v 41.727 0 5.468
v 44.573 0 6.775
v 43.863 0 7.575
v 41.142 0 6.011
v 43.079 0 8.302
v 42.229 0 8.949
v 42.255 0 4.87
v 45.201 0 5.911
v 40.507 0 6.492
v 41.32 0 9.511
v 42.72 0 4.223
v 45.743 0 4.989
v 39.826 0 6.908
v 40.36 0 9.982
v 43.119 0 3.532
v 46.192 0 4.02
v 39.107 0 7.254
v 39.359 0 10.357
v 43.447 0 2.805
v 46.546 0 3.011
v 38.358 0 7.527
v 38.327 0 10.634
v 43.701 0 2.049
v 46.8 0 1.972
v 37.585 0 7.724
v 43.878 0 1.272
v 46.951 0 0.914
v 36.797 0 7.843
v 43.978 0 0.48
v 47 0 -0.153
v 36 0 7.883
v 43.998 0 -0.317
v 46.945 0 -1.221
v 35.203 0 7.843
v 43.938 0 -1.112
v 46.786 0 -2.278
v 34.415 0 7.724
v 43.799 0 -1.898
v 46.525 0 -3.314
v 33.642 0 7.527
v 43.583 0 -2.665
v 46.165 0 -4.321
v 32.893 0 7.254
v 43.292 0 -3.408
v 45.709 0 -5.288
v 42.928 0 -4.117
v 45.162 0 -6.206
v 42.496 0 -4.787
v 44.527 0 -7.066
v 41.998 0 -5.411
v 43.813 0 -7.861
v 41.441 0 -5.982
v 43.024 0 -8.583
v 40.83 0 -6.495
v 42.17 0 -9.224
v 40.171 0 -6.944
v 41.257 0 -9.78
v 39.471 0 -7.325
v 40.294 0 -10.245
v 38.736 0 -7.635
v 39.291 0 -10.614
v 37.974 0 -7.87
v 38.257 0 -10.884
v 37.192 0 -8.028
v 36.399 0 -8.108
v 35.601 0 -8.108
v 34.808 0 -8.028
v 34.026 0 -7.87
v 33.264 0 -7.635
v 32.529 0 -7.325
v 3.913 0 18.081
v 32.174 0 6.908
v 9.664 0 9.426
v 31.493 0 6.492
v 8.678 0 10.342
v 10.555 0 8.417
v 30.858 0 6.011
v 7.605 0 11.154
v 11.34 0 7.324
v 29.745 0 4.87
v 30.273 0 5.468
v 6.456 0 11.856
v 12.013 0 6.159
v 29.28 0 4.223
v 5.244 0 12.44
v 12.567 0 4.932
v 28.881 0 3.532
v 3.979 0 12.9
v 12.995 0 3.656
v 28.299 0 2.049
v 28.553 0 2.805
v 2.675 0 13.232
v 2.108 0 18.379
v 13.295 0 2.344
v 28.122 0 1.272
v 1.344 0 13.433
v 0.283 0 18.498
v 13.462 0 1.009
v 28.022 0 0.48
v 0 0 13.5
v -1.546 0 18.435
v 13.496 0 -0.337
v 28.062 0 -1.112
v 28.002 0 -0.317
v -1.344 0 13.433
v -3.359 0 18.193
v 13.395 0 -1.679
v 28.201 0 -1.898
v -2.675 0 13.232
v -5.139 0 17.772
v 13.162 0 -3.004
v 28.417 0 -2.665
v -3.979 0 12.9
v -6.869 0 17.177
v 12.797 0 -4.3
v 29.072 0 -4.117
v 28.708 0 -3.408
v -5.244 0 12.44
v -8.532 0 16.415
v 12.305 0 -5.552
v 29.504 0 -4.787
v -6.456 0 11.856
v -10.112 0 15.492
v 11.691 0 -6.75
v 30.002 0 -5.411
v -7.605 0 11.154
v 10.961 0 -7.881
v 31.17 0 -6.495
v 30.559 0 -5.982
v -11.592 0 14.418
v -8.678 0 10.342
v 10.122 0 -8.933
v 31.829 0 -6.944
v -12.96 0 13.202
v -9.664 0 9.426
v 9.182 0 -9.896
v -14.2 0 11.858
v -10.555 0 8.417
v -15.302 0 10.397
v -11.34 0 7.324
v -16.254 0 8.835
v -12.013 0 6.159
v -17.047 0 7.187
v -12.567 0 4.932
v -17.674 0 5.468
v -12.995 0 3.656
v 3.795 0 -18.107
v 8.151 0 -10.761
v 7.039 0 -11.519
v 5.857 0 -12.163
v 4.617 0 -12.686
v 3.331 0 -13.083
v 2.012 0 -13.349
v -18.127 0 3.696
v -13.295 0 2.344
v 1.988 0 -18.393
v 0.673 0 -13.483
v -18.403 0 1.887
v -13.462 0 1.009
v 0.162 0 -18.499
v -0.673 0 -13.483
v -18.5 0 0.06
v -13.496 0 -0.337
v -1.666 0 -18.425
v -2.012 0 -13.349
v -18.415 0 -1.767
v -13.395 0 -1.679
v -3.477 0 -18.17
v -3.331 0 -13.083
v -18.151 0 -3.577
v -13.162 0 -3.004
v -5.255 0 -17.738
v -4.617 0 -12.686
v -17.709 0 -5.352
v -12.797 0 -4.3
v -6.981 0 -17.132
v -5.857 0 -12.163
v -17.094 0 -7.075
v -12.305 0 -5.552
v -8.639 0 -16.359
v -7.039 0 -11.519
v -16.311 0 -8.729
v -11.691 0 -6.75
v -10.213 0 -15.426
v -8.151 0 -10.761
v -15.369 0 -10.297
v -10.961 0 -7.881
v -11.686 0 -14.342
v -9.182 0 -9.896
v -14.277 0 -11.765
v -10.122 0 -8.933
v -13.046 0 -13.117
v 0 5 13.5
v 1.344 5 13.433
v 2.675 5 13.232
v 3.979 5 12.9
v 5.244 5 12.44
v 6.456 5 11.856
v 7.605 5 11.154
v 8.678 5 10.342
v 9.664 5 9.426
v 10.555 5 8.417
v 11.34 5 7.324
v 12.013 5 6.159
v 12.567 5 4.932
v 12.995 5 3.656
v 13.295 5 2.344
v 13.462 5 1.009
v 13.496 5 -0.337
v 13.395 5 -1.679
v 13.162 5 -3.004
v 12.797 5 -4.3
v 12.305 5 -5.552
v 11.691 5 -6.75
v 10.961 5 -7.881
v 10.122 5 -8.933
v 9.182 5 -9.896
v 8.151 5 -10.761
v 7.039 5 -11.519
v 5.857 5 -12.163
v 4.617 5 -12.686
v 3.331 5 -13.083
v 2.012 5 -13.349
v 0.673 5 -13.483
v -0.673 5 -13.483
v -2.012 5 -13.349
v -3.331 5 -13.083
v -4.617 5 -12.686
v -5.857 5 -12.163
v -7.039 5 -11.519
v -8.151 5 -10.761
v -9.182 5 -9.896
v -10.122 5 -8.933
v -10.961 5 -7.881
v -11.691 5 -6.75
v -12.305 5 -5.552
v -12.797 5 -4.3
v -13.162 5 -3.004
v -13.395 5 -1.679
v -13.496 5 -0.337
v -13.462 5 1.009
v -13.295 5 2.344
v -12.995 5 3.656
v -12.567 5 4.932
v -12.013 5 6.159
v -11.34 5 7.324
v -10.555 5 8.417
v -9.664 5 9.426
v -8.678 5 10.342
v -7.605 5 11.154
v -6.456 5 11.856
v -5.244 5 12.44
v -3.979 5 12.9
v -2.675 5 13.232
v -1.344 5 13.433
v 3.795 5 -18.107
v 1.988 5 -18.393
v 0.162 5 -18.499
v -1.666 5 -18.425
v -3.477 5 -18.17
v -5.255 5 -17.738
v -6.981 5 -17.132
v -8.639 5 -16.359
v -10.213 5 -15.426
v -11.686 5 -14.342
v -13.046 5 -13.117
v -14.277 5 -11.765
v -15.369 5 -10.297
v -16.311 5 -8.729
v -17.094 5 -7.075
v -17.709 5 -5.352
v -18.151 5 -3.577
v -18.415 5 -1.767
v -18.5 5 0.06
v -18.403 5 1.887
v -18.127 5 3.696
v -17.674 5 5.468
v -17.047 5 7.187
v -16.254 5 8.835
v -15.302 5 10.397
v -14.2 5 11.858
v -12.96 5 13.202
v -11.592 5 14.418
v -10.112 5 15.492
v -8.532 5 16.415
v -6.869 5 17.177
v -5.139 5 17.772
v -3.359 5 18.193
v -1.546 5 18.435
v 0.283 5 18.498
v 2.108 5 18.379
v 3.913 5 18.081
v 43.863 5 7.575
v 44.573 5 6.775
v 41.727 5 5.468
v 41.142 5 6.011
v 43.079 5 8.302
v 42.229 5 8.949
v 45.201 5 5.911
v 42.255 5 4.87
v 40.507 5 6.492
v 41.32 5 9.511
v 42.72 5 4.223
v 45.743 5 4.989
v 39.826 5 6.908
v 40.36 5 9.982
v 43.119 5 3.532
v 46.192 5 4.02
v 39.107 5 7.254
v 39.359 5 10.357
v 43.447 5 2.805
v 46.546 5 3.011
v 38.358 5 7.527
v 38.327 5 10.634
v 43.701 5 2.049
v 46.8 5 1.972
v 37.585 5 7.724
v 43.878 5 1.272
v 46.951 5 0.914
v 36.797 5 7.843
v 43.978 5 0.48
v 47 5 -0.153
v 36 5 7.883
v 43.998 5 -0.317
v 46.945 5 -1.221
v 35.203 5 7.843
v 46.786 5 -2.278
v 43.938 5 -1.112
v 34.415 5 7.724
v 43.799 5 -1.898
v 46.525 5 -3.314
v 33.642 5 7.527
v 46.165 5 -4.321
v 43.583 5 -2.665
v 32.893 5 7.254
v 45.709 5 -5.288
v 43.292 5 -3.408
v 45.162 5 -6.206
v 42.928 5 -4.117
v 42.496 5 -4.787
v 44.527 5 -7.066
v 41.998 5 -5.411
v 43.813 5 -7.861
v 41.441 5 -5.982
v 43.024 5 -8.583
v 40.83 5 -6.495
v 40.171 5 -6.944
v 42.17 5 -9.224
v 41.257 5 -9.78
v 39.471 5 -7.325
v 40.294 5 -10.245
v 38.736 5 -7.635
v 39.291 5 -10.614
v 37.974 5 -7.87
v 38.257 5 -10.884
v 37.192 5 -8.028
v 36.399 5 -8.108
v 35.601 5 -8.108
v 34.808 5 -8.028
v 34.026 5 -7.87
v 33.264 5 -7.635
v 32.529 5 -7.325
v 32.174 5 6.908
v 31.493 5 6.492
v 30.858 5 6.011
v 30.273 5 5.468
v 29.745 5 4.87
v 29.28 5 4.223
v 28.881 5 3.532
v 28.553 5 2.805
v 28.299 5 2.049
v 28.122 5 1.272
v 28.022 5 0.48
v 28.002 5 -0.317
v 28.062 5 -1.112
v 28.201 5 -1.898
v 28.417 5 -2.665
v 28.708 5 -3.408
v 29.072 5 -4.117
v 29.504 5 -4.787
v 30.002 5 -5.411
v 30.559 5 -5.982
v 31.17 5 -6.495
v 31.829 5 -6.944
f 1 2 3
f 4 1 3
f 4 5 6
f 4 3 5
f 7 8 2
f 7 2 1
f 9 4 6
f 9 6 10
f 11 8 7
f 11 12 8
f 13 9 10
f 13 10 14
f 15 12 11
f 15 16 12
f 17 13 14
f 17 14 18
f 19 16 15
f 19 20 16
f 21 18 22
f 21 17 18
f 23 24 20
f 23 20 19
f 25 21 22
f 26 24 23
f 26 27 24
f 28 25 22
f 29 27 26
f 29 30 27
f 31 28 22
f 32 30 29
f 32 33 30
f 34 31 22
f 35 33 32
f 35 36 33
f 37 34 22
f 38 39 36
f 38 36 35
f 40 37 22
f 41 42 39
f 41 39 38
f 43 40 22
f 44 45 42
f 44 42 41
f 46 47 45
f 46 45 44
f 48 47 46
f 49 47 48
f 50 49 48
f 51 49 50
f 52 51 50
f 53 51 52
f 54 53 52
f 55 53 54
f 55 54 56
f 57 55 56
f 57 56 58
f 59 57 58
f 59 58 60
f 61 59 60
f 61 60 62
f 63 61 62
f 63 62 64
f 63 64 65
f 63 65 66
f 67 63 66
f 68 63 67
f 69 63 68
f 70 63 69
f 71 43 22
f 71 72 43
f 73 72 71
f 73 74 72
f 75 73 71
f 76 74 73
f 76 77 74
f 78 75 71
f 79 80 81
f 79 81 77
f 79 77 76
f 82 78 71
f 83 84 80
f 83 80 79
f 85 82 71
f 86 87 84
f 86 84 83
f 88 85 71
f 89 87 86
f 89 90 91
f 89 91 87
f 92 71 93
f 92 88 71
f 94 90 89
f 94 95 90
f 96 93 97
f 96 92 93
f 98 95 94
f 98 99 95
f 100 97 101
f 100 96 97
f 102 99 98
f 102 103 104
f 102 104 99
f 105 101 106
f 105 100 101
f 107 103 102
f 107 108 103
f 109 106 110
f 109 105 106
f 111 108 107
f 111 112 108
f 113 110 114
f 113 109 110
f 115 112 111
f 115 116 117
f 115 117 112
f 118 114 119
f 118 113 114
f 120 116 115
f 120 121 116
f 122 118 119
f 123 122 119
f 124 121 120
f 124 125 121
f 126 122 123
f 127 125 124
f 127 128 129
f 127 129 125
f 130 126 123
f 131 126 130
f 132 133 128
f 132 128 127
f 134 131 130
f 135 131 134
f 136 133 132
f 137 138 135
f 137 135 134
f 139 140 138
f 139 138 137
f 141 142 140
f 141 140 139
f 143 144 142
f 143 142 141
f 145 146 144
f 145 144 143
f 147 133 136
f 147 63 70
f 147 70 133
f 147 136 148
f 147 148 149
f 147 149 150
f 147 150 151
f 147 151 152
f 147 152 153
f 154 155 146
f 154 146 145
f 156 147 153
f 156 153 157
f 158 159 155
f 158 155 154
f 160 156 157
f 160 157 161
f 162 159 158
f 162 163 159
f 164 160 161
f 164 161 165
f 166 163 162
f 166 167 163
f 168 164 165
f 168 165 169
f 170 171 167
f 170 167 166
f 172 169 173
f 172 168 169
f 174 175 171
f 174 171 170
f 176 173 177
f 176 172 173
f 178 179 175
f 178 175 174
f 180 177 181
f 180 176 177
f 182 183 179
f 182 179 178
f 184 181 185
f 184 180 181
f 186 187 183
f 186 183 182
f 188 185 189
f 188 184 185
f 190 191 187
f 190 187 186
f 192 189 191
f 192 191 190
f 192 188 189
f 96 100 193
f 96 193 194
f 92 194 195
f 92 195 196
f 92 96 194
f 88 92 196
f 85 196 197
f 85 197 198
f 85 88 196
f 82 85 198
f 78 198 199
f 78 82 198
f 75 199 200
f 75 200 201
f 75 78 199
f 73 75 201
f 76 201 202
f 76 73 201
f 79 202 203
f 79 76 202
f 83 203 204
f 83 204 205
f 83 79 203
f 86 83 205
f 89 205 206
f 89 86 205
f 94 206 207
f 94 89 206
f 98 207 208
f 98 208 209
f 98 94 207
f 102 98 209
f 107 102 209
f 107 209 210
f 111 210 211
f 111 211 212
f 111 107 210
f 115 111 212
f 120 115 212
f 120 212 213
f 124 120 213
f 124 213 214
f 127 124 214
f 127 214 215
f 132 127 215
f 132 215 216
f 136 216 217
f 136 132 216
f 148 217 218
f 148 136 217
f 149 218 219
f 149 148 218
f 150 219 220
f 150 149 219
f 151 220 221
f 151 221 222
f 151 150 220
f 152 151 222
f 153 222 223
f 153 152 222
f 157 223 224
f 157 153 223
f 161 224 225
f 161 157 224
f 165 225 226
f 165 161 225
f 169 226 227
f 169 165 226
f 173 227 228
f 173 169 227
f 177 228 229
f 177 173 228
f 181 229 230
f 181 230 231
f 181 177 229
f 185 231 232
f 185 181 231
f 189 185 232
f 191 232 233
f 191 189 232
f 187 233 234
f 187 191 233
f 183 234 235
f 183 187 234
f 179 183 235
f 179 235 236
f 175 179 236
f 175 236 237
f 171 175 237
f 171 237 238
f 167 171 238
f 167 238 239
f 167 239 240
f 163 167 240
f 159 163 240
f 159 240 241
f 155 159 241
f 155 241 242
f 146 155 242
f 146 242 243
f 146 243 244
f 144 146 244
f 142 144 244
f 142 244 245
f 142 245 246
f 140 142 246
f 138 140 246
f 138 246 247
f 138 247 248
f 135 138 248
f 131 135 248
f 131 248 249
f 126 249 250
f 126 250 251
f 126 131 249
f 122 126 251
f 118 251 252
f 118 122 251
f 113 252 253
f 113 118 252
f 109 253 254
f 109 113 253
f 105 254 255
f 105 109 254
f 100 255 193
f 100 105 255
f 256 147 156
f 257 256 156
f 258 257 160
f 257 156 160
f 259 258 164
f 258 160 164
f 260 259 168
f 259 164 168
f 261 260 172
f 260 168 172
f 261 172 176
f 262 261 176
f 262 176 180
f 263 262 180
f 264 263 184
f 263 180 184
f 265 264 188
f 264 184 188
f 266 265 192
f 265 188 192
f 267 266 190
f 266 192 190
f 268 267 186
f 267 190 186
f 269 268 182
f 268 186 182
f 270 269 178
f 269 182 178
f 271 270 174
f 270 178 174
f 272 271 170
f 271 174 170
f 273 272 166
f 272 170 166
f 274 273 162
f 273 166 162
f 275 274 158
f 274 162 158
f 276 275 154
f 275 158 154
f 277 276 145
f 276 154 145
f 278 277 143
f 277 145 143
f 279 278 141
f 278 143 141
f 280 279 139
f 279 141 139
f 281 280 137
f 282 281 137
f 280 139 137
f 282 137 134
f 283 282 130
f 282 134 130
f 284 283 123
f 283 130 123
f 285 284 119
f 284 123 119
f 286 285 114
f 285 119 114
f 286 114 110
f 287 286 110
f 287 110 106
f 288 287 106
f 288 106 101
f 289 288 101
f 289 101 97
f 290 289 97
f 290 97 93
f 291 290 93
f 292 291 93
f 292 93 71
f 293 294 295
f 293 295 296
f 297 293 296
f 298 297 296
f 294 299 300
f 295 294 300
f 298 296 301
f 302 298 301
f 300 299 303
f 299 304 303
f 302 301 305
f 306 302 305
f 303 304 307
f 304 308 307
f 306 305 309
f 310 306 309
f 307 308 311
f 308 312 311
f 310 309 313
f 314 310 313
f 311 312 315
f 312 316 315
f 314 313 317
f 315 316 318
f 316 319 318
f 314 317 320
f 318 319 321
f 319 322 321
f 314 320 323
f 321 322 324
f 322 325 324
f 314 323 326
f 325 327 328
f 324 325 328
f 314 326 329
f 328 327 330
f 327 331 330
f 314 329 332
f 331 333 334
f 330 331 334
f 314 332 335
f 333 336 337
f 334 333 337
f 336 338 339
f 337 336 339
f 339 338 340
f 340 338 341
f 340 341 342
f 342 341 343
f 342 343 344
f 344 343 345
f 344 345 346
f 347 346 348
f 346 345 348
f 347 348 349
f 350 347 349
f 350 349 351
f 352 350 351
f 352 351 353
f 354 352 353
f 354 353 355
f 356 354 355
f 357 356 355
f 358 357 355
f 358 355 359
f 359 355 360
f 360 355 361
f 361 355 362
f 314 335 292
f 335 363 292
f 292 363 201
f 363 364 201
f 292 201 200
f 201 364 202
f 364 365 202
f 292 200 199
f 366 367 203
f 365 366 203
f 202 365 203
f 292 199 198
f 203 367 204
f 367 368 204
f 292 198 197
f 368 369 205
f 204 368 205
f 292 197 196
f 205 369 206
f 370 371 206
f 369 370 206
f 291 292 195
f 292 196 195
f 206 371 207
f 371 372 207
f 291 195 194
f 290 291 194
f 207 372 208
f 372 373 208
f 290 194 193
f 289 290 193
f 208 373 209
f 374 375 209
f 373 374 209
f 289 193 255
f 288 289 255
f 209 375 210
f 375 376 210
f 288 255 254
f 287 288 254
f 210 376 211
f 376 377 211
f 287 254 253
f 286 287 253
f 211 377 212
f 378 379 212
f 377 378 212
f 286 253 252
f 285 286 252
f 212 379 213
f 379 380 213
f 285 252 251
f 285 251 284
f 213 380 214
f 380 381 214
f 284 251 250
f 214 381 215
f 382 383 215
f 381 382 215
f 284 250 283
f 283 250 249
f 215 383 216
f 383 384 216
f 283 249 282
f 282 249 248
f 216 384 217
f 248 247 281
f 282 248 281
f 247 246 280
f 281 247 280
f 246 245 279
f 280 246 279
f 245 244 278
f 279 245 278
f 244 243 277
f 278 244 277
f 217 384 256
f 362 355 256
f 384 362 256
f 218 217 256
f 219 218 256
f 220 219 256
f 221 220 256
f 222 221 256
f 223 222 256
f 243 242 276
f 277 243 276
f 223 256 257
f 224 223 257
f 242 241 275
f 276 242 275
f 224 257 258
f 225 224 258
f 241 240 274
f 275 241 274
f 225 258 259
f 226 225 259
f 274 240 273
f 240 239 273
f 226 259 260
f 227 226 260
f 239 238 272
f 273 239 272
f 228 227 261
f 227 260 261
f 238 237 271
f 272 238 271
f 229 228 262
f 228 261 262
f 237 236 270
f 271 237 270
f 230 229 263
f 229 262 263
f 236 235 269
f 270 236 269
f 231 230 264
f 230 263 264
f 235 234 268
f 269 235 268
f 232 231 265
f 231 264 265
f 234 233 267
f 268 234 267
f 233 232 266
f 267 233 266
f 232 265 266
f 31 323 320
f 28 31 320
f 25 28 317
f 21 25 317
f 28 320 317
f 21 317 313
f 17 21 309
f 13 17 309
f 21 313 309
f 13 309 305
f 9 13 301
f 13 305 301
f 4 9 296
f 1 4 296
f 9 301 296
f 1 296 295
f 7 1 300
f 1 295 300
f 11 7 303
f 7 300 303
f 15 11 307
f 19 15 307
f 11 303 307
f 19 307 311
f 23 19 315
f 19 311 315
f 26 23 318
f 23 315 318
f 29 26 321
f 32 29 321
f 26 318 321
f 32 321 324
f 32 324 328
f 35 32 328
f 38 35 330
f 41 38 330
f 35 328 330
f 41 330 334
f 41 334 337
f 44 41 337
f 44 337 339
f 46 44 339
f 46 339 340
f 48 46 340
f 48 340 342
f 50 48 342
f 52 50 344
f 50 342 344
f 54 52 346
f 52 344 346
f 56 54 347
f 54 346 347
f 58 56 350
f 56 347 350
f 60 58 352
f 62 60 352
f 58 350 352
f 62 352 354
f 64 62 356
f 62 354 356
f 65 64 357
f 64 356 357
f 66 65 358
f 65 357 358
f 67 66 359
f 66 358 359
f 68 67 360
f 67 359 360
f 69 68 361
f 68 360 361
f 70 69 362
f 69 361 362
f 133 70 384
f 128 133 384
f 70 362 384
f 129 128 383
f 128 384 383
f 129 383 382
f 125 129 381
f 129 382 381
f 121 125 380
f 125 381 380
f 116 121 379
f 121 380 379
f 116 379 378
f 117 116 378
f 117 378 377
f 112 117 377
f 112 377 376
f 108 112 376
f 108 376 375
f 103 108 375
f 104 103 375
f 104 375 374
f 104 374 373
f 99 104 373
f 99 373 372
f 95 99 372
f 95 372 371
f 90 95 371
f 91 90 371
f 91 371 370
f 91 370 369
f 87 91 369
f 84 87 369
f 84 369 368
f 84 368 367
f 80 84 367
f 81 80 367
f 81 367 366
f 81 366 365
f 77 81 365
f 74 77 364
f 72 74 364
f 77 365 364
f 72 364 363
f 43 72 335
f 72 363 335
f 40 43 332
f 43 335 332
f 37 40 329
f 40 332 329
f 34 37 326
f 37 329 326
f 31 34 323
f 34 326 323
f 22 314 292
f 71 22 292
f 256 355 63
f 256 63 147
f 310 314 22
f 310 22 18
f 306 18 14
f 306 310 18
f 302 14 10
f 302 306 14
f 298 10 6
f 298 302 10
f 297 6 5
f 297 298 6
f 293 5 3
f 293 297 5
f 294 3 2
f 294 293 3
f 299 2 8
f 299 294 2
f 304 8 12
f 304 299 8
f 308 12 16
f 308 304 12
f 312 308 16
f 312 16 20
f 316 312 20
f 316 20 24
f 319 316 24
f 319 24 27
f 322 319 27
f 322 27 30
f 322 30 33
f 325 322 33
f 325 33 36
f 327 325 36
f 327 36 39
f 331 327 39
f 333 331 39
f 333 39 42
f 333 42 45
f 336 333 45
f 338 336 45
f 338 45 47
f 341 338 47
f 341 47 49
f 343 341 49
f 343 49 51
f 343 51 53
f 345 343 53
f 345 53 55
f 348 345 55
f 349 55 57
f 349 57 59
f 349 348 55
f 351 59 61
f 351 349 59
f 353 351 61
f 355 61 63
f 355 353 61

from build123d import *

# Parameters (mm, degrees)
SKETCH2_R           = 18.5
SKETCH2_R_2         = 13.5
BOSS_EXTRUDE2_DEPTH = 5
BOSS_EXTRUDE3_DEPTH = 5
SKETCH4_R           = 11
BOSS_EXTRUDE4_DEPTH = 5
SKETCH5_R           = 8
CUT_EXTRUDE1_DEPTH  = 5
BOSS_EXTRUDE5_DEPTH = 5
BOSS_EXTRUDE6_DEPTH = 5


with BuildPart() as part:
    # Sketch2 → Boss-Extrude2 (new body)
    with BuildSketch(Plane(origin=(0, 0, 0), x_dir=(1, 0, 0), z_dir=(0, 1, 0))):
        with Locations(Location((0, 0, 0), (0, 0, 270))):
            Circle(SKETCH2_R)
        with Locations(Location((0, 0, 0), (0, 0, 270))):
            Circle(SKETCH2_R_2, mode=Mode.SUBTRACT)
    extrude(amount=BOSS_EXTRUDE2_DEPTH)

    # Sketch3 → Boss-Extrude3 (add)
    with BuildSketch(Plane(origin=(0, 5, 0), x_dir=(1, 0, 0), z_dir=(0, 1, 0))):
        Polygon((25.460427034, 3.126984488), (25.460427034, -2.892028048), (18.27255247, -2.892028048), (18.27255247, 2.892028048), align=None)
    extrude(amount=-BOSS_EXTRUDE3_DEPTH)

    # Sketch4 → Boss-Extrude4 (add)
    with BuildSketch(Plane(origin=(0, 5, 0), x_dir=(1, 0, 0), z_dir=(0, 1, 0))):
        with Locations((36, 0.11747822)):
            Circle(SKETCH4_R)
    extrude(amount=-BOSS_EXTRUDE4_DEPTH)

    # Sketch5 → Cut-Extrude1 (cut)
    with BuildSketch(Plane(origin=(0, 5, 0), x_dir=(1, 0, 0), z_dir=(0, 1, 0))):
        with Locations(Location((36, 0.11747822, 0), (0, 0, 270))):
            Circle(SKETCH5_R)
    extrude(amount=-CUT_EXTRUDE1_DEPTH, mode=Mode.SUBTRACT)

    # Sketch6 → Boss-Extrude5 (add)
    with BuildSketch(Plane(origin=(0, 5, 0), x_dir=(1, 0, 0), z_dir=(0, 1, 0))):
        Polygon((38.256533955, 10.883538526), (3.795079834, 18.106555969), (18.27255247, 2.892028048), (25.419311952, 3.125640523), align=None)
    extrude(amount=-BOSS_EXTRUDE5_DEPTH)

    # Sketch7 → Boss-Extrude6 (add)
    with BuildSketch(Plane(origin=(0, 5, 0), x_dir=(1, 0, 0), z_dir=(0, 1, 0))):
        Polygon((38.32675057, -10.633625527), (3.913171414, -18.081401757), (18.27255247, -2.892028048), (25.419694143, -2.892028048), align=None)
    extrude(amount=-BOSS_EXTRUDE6_DEPTH)


solid = part.part
